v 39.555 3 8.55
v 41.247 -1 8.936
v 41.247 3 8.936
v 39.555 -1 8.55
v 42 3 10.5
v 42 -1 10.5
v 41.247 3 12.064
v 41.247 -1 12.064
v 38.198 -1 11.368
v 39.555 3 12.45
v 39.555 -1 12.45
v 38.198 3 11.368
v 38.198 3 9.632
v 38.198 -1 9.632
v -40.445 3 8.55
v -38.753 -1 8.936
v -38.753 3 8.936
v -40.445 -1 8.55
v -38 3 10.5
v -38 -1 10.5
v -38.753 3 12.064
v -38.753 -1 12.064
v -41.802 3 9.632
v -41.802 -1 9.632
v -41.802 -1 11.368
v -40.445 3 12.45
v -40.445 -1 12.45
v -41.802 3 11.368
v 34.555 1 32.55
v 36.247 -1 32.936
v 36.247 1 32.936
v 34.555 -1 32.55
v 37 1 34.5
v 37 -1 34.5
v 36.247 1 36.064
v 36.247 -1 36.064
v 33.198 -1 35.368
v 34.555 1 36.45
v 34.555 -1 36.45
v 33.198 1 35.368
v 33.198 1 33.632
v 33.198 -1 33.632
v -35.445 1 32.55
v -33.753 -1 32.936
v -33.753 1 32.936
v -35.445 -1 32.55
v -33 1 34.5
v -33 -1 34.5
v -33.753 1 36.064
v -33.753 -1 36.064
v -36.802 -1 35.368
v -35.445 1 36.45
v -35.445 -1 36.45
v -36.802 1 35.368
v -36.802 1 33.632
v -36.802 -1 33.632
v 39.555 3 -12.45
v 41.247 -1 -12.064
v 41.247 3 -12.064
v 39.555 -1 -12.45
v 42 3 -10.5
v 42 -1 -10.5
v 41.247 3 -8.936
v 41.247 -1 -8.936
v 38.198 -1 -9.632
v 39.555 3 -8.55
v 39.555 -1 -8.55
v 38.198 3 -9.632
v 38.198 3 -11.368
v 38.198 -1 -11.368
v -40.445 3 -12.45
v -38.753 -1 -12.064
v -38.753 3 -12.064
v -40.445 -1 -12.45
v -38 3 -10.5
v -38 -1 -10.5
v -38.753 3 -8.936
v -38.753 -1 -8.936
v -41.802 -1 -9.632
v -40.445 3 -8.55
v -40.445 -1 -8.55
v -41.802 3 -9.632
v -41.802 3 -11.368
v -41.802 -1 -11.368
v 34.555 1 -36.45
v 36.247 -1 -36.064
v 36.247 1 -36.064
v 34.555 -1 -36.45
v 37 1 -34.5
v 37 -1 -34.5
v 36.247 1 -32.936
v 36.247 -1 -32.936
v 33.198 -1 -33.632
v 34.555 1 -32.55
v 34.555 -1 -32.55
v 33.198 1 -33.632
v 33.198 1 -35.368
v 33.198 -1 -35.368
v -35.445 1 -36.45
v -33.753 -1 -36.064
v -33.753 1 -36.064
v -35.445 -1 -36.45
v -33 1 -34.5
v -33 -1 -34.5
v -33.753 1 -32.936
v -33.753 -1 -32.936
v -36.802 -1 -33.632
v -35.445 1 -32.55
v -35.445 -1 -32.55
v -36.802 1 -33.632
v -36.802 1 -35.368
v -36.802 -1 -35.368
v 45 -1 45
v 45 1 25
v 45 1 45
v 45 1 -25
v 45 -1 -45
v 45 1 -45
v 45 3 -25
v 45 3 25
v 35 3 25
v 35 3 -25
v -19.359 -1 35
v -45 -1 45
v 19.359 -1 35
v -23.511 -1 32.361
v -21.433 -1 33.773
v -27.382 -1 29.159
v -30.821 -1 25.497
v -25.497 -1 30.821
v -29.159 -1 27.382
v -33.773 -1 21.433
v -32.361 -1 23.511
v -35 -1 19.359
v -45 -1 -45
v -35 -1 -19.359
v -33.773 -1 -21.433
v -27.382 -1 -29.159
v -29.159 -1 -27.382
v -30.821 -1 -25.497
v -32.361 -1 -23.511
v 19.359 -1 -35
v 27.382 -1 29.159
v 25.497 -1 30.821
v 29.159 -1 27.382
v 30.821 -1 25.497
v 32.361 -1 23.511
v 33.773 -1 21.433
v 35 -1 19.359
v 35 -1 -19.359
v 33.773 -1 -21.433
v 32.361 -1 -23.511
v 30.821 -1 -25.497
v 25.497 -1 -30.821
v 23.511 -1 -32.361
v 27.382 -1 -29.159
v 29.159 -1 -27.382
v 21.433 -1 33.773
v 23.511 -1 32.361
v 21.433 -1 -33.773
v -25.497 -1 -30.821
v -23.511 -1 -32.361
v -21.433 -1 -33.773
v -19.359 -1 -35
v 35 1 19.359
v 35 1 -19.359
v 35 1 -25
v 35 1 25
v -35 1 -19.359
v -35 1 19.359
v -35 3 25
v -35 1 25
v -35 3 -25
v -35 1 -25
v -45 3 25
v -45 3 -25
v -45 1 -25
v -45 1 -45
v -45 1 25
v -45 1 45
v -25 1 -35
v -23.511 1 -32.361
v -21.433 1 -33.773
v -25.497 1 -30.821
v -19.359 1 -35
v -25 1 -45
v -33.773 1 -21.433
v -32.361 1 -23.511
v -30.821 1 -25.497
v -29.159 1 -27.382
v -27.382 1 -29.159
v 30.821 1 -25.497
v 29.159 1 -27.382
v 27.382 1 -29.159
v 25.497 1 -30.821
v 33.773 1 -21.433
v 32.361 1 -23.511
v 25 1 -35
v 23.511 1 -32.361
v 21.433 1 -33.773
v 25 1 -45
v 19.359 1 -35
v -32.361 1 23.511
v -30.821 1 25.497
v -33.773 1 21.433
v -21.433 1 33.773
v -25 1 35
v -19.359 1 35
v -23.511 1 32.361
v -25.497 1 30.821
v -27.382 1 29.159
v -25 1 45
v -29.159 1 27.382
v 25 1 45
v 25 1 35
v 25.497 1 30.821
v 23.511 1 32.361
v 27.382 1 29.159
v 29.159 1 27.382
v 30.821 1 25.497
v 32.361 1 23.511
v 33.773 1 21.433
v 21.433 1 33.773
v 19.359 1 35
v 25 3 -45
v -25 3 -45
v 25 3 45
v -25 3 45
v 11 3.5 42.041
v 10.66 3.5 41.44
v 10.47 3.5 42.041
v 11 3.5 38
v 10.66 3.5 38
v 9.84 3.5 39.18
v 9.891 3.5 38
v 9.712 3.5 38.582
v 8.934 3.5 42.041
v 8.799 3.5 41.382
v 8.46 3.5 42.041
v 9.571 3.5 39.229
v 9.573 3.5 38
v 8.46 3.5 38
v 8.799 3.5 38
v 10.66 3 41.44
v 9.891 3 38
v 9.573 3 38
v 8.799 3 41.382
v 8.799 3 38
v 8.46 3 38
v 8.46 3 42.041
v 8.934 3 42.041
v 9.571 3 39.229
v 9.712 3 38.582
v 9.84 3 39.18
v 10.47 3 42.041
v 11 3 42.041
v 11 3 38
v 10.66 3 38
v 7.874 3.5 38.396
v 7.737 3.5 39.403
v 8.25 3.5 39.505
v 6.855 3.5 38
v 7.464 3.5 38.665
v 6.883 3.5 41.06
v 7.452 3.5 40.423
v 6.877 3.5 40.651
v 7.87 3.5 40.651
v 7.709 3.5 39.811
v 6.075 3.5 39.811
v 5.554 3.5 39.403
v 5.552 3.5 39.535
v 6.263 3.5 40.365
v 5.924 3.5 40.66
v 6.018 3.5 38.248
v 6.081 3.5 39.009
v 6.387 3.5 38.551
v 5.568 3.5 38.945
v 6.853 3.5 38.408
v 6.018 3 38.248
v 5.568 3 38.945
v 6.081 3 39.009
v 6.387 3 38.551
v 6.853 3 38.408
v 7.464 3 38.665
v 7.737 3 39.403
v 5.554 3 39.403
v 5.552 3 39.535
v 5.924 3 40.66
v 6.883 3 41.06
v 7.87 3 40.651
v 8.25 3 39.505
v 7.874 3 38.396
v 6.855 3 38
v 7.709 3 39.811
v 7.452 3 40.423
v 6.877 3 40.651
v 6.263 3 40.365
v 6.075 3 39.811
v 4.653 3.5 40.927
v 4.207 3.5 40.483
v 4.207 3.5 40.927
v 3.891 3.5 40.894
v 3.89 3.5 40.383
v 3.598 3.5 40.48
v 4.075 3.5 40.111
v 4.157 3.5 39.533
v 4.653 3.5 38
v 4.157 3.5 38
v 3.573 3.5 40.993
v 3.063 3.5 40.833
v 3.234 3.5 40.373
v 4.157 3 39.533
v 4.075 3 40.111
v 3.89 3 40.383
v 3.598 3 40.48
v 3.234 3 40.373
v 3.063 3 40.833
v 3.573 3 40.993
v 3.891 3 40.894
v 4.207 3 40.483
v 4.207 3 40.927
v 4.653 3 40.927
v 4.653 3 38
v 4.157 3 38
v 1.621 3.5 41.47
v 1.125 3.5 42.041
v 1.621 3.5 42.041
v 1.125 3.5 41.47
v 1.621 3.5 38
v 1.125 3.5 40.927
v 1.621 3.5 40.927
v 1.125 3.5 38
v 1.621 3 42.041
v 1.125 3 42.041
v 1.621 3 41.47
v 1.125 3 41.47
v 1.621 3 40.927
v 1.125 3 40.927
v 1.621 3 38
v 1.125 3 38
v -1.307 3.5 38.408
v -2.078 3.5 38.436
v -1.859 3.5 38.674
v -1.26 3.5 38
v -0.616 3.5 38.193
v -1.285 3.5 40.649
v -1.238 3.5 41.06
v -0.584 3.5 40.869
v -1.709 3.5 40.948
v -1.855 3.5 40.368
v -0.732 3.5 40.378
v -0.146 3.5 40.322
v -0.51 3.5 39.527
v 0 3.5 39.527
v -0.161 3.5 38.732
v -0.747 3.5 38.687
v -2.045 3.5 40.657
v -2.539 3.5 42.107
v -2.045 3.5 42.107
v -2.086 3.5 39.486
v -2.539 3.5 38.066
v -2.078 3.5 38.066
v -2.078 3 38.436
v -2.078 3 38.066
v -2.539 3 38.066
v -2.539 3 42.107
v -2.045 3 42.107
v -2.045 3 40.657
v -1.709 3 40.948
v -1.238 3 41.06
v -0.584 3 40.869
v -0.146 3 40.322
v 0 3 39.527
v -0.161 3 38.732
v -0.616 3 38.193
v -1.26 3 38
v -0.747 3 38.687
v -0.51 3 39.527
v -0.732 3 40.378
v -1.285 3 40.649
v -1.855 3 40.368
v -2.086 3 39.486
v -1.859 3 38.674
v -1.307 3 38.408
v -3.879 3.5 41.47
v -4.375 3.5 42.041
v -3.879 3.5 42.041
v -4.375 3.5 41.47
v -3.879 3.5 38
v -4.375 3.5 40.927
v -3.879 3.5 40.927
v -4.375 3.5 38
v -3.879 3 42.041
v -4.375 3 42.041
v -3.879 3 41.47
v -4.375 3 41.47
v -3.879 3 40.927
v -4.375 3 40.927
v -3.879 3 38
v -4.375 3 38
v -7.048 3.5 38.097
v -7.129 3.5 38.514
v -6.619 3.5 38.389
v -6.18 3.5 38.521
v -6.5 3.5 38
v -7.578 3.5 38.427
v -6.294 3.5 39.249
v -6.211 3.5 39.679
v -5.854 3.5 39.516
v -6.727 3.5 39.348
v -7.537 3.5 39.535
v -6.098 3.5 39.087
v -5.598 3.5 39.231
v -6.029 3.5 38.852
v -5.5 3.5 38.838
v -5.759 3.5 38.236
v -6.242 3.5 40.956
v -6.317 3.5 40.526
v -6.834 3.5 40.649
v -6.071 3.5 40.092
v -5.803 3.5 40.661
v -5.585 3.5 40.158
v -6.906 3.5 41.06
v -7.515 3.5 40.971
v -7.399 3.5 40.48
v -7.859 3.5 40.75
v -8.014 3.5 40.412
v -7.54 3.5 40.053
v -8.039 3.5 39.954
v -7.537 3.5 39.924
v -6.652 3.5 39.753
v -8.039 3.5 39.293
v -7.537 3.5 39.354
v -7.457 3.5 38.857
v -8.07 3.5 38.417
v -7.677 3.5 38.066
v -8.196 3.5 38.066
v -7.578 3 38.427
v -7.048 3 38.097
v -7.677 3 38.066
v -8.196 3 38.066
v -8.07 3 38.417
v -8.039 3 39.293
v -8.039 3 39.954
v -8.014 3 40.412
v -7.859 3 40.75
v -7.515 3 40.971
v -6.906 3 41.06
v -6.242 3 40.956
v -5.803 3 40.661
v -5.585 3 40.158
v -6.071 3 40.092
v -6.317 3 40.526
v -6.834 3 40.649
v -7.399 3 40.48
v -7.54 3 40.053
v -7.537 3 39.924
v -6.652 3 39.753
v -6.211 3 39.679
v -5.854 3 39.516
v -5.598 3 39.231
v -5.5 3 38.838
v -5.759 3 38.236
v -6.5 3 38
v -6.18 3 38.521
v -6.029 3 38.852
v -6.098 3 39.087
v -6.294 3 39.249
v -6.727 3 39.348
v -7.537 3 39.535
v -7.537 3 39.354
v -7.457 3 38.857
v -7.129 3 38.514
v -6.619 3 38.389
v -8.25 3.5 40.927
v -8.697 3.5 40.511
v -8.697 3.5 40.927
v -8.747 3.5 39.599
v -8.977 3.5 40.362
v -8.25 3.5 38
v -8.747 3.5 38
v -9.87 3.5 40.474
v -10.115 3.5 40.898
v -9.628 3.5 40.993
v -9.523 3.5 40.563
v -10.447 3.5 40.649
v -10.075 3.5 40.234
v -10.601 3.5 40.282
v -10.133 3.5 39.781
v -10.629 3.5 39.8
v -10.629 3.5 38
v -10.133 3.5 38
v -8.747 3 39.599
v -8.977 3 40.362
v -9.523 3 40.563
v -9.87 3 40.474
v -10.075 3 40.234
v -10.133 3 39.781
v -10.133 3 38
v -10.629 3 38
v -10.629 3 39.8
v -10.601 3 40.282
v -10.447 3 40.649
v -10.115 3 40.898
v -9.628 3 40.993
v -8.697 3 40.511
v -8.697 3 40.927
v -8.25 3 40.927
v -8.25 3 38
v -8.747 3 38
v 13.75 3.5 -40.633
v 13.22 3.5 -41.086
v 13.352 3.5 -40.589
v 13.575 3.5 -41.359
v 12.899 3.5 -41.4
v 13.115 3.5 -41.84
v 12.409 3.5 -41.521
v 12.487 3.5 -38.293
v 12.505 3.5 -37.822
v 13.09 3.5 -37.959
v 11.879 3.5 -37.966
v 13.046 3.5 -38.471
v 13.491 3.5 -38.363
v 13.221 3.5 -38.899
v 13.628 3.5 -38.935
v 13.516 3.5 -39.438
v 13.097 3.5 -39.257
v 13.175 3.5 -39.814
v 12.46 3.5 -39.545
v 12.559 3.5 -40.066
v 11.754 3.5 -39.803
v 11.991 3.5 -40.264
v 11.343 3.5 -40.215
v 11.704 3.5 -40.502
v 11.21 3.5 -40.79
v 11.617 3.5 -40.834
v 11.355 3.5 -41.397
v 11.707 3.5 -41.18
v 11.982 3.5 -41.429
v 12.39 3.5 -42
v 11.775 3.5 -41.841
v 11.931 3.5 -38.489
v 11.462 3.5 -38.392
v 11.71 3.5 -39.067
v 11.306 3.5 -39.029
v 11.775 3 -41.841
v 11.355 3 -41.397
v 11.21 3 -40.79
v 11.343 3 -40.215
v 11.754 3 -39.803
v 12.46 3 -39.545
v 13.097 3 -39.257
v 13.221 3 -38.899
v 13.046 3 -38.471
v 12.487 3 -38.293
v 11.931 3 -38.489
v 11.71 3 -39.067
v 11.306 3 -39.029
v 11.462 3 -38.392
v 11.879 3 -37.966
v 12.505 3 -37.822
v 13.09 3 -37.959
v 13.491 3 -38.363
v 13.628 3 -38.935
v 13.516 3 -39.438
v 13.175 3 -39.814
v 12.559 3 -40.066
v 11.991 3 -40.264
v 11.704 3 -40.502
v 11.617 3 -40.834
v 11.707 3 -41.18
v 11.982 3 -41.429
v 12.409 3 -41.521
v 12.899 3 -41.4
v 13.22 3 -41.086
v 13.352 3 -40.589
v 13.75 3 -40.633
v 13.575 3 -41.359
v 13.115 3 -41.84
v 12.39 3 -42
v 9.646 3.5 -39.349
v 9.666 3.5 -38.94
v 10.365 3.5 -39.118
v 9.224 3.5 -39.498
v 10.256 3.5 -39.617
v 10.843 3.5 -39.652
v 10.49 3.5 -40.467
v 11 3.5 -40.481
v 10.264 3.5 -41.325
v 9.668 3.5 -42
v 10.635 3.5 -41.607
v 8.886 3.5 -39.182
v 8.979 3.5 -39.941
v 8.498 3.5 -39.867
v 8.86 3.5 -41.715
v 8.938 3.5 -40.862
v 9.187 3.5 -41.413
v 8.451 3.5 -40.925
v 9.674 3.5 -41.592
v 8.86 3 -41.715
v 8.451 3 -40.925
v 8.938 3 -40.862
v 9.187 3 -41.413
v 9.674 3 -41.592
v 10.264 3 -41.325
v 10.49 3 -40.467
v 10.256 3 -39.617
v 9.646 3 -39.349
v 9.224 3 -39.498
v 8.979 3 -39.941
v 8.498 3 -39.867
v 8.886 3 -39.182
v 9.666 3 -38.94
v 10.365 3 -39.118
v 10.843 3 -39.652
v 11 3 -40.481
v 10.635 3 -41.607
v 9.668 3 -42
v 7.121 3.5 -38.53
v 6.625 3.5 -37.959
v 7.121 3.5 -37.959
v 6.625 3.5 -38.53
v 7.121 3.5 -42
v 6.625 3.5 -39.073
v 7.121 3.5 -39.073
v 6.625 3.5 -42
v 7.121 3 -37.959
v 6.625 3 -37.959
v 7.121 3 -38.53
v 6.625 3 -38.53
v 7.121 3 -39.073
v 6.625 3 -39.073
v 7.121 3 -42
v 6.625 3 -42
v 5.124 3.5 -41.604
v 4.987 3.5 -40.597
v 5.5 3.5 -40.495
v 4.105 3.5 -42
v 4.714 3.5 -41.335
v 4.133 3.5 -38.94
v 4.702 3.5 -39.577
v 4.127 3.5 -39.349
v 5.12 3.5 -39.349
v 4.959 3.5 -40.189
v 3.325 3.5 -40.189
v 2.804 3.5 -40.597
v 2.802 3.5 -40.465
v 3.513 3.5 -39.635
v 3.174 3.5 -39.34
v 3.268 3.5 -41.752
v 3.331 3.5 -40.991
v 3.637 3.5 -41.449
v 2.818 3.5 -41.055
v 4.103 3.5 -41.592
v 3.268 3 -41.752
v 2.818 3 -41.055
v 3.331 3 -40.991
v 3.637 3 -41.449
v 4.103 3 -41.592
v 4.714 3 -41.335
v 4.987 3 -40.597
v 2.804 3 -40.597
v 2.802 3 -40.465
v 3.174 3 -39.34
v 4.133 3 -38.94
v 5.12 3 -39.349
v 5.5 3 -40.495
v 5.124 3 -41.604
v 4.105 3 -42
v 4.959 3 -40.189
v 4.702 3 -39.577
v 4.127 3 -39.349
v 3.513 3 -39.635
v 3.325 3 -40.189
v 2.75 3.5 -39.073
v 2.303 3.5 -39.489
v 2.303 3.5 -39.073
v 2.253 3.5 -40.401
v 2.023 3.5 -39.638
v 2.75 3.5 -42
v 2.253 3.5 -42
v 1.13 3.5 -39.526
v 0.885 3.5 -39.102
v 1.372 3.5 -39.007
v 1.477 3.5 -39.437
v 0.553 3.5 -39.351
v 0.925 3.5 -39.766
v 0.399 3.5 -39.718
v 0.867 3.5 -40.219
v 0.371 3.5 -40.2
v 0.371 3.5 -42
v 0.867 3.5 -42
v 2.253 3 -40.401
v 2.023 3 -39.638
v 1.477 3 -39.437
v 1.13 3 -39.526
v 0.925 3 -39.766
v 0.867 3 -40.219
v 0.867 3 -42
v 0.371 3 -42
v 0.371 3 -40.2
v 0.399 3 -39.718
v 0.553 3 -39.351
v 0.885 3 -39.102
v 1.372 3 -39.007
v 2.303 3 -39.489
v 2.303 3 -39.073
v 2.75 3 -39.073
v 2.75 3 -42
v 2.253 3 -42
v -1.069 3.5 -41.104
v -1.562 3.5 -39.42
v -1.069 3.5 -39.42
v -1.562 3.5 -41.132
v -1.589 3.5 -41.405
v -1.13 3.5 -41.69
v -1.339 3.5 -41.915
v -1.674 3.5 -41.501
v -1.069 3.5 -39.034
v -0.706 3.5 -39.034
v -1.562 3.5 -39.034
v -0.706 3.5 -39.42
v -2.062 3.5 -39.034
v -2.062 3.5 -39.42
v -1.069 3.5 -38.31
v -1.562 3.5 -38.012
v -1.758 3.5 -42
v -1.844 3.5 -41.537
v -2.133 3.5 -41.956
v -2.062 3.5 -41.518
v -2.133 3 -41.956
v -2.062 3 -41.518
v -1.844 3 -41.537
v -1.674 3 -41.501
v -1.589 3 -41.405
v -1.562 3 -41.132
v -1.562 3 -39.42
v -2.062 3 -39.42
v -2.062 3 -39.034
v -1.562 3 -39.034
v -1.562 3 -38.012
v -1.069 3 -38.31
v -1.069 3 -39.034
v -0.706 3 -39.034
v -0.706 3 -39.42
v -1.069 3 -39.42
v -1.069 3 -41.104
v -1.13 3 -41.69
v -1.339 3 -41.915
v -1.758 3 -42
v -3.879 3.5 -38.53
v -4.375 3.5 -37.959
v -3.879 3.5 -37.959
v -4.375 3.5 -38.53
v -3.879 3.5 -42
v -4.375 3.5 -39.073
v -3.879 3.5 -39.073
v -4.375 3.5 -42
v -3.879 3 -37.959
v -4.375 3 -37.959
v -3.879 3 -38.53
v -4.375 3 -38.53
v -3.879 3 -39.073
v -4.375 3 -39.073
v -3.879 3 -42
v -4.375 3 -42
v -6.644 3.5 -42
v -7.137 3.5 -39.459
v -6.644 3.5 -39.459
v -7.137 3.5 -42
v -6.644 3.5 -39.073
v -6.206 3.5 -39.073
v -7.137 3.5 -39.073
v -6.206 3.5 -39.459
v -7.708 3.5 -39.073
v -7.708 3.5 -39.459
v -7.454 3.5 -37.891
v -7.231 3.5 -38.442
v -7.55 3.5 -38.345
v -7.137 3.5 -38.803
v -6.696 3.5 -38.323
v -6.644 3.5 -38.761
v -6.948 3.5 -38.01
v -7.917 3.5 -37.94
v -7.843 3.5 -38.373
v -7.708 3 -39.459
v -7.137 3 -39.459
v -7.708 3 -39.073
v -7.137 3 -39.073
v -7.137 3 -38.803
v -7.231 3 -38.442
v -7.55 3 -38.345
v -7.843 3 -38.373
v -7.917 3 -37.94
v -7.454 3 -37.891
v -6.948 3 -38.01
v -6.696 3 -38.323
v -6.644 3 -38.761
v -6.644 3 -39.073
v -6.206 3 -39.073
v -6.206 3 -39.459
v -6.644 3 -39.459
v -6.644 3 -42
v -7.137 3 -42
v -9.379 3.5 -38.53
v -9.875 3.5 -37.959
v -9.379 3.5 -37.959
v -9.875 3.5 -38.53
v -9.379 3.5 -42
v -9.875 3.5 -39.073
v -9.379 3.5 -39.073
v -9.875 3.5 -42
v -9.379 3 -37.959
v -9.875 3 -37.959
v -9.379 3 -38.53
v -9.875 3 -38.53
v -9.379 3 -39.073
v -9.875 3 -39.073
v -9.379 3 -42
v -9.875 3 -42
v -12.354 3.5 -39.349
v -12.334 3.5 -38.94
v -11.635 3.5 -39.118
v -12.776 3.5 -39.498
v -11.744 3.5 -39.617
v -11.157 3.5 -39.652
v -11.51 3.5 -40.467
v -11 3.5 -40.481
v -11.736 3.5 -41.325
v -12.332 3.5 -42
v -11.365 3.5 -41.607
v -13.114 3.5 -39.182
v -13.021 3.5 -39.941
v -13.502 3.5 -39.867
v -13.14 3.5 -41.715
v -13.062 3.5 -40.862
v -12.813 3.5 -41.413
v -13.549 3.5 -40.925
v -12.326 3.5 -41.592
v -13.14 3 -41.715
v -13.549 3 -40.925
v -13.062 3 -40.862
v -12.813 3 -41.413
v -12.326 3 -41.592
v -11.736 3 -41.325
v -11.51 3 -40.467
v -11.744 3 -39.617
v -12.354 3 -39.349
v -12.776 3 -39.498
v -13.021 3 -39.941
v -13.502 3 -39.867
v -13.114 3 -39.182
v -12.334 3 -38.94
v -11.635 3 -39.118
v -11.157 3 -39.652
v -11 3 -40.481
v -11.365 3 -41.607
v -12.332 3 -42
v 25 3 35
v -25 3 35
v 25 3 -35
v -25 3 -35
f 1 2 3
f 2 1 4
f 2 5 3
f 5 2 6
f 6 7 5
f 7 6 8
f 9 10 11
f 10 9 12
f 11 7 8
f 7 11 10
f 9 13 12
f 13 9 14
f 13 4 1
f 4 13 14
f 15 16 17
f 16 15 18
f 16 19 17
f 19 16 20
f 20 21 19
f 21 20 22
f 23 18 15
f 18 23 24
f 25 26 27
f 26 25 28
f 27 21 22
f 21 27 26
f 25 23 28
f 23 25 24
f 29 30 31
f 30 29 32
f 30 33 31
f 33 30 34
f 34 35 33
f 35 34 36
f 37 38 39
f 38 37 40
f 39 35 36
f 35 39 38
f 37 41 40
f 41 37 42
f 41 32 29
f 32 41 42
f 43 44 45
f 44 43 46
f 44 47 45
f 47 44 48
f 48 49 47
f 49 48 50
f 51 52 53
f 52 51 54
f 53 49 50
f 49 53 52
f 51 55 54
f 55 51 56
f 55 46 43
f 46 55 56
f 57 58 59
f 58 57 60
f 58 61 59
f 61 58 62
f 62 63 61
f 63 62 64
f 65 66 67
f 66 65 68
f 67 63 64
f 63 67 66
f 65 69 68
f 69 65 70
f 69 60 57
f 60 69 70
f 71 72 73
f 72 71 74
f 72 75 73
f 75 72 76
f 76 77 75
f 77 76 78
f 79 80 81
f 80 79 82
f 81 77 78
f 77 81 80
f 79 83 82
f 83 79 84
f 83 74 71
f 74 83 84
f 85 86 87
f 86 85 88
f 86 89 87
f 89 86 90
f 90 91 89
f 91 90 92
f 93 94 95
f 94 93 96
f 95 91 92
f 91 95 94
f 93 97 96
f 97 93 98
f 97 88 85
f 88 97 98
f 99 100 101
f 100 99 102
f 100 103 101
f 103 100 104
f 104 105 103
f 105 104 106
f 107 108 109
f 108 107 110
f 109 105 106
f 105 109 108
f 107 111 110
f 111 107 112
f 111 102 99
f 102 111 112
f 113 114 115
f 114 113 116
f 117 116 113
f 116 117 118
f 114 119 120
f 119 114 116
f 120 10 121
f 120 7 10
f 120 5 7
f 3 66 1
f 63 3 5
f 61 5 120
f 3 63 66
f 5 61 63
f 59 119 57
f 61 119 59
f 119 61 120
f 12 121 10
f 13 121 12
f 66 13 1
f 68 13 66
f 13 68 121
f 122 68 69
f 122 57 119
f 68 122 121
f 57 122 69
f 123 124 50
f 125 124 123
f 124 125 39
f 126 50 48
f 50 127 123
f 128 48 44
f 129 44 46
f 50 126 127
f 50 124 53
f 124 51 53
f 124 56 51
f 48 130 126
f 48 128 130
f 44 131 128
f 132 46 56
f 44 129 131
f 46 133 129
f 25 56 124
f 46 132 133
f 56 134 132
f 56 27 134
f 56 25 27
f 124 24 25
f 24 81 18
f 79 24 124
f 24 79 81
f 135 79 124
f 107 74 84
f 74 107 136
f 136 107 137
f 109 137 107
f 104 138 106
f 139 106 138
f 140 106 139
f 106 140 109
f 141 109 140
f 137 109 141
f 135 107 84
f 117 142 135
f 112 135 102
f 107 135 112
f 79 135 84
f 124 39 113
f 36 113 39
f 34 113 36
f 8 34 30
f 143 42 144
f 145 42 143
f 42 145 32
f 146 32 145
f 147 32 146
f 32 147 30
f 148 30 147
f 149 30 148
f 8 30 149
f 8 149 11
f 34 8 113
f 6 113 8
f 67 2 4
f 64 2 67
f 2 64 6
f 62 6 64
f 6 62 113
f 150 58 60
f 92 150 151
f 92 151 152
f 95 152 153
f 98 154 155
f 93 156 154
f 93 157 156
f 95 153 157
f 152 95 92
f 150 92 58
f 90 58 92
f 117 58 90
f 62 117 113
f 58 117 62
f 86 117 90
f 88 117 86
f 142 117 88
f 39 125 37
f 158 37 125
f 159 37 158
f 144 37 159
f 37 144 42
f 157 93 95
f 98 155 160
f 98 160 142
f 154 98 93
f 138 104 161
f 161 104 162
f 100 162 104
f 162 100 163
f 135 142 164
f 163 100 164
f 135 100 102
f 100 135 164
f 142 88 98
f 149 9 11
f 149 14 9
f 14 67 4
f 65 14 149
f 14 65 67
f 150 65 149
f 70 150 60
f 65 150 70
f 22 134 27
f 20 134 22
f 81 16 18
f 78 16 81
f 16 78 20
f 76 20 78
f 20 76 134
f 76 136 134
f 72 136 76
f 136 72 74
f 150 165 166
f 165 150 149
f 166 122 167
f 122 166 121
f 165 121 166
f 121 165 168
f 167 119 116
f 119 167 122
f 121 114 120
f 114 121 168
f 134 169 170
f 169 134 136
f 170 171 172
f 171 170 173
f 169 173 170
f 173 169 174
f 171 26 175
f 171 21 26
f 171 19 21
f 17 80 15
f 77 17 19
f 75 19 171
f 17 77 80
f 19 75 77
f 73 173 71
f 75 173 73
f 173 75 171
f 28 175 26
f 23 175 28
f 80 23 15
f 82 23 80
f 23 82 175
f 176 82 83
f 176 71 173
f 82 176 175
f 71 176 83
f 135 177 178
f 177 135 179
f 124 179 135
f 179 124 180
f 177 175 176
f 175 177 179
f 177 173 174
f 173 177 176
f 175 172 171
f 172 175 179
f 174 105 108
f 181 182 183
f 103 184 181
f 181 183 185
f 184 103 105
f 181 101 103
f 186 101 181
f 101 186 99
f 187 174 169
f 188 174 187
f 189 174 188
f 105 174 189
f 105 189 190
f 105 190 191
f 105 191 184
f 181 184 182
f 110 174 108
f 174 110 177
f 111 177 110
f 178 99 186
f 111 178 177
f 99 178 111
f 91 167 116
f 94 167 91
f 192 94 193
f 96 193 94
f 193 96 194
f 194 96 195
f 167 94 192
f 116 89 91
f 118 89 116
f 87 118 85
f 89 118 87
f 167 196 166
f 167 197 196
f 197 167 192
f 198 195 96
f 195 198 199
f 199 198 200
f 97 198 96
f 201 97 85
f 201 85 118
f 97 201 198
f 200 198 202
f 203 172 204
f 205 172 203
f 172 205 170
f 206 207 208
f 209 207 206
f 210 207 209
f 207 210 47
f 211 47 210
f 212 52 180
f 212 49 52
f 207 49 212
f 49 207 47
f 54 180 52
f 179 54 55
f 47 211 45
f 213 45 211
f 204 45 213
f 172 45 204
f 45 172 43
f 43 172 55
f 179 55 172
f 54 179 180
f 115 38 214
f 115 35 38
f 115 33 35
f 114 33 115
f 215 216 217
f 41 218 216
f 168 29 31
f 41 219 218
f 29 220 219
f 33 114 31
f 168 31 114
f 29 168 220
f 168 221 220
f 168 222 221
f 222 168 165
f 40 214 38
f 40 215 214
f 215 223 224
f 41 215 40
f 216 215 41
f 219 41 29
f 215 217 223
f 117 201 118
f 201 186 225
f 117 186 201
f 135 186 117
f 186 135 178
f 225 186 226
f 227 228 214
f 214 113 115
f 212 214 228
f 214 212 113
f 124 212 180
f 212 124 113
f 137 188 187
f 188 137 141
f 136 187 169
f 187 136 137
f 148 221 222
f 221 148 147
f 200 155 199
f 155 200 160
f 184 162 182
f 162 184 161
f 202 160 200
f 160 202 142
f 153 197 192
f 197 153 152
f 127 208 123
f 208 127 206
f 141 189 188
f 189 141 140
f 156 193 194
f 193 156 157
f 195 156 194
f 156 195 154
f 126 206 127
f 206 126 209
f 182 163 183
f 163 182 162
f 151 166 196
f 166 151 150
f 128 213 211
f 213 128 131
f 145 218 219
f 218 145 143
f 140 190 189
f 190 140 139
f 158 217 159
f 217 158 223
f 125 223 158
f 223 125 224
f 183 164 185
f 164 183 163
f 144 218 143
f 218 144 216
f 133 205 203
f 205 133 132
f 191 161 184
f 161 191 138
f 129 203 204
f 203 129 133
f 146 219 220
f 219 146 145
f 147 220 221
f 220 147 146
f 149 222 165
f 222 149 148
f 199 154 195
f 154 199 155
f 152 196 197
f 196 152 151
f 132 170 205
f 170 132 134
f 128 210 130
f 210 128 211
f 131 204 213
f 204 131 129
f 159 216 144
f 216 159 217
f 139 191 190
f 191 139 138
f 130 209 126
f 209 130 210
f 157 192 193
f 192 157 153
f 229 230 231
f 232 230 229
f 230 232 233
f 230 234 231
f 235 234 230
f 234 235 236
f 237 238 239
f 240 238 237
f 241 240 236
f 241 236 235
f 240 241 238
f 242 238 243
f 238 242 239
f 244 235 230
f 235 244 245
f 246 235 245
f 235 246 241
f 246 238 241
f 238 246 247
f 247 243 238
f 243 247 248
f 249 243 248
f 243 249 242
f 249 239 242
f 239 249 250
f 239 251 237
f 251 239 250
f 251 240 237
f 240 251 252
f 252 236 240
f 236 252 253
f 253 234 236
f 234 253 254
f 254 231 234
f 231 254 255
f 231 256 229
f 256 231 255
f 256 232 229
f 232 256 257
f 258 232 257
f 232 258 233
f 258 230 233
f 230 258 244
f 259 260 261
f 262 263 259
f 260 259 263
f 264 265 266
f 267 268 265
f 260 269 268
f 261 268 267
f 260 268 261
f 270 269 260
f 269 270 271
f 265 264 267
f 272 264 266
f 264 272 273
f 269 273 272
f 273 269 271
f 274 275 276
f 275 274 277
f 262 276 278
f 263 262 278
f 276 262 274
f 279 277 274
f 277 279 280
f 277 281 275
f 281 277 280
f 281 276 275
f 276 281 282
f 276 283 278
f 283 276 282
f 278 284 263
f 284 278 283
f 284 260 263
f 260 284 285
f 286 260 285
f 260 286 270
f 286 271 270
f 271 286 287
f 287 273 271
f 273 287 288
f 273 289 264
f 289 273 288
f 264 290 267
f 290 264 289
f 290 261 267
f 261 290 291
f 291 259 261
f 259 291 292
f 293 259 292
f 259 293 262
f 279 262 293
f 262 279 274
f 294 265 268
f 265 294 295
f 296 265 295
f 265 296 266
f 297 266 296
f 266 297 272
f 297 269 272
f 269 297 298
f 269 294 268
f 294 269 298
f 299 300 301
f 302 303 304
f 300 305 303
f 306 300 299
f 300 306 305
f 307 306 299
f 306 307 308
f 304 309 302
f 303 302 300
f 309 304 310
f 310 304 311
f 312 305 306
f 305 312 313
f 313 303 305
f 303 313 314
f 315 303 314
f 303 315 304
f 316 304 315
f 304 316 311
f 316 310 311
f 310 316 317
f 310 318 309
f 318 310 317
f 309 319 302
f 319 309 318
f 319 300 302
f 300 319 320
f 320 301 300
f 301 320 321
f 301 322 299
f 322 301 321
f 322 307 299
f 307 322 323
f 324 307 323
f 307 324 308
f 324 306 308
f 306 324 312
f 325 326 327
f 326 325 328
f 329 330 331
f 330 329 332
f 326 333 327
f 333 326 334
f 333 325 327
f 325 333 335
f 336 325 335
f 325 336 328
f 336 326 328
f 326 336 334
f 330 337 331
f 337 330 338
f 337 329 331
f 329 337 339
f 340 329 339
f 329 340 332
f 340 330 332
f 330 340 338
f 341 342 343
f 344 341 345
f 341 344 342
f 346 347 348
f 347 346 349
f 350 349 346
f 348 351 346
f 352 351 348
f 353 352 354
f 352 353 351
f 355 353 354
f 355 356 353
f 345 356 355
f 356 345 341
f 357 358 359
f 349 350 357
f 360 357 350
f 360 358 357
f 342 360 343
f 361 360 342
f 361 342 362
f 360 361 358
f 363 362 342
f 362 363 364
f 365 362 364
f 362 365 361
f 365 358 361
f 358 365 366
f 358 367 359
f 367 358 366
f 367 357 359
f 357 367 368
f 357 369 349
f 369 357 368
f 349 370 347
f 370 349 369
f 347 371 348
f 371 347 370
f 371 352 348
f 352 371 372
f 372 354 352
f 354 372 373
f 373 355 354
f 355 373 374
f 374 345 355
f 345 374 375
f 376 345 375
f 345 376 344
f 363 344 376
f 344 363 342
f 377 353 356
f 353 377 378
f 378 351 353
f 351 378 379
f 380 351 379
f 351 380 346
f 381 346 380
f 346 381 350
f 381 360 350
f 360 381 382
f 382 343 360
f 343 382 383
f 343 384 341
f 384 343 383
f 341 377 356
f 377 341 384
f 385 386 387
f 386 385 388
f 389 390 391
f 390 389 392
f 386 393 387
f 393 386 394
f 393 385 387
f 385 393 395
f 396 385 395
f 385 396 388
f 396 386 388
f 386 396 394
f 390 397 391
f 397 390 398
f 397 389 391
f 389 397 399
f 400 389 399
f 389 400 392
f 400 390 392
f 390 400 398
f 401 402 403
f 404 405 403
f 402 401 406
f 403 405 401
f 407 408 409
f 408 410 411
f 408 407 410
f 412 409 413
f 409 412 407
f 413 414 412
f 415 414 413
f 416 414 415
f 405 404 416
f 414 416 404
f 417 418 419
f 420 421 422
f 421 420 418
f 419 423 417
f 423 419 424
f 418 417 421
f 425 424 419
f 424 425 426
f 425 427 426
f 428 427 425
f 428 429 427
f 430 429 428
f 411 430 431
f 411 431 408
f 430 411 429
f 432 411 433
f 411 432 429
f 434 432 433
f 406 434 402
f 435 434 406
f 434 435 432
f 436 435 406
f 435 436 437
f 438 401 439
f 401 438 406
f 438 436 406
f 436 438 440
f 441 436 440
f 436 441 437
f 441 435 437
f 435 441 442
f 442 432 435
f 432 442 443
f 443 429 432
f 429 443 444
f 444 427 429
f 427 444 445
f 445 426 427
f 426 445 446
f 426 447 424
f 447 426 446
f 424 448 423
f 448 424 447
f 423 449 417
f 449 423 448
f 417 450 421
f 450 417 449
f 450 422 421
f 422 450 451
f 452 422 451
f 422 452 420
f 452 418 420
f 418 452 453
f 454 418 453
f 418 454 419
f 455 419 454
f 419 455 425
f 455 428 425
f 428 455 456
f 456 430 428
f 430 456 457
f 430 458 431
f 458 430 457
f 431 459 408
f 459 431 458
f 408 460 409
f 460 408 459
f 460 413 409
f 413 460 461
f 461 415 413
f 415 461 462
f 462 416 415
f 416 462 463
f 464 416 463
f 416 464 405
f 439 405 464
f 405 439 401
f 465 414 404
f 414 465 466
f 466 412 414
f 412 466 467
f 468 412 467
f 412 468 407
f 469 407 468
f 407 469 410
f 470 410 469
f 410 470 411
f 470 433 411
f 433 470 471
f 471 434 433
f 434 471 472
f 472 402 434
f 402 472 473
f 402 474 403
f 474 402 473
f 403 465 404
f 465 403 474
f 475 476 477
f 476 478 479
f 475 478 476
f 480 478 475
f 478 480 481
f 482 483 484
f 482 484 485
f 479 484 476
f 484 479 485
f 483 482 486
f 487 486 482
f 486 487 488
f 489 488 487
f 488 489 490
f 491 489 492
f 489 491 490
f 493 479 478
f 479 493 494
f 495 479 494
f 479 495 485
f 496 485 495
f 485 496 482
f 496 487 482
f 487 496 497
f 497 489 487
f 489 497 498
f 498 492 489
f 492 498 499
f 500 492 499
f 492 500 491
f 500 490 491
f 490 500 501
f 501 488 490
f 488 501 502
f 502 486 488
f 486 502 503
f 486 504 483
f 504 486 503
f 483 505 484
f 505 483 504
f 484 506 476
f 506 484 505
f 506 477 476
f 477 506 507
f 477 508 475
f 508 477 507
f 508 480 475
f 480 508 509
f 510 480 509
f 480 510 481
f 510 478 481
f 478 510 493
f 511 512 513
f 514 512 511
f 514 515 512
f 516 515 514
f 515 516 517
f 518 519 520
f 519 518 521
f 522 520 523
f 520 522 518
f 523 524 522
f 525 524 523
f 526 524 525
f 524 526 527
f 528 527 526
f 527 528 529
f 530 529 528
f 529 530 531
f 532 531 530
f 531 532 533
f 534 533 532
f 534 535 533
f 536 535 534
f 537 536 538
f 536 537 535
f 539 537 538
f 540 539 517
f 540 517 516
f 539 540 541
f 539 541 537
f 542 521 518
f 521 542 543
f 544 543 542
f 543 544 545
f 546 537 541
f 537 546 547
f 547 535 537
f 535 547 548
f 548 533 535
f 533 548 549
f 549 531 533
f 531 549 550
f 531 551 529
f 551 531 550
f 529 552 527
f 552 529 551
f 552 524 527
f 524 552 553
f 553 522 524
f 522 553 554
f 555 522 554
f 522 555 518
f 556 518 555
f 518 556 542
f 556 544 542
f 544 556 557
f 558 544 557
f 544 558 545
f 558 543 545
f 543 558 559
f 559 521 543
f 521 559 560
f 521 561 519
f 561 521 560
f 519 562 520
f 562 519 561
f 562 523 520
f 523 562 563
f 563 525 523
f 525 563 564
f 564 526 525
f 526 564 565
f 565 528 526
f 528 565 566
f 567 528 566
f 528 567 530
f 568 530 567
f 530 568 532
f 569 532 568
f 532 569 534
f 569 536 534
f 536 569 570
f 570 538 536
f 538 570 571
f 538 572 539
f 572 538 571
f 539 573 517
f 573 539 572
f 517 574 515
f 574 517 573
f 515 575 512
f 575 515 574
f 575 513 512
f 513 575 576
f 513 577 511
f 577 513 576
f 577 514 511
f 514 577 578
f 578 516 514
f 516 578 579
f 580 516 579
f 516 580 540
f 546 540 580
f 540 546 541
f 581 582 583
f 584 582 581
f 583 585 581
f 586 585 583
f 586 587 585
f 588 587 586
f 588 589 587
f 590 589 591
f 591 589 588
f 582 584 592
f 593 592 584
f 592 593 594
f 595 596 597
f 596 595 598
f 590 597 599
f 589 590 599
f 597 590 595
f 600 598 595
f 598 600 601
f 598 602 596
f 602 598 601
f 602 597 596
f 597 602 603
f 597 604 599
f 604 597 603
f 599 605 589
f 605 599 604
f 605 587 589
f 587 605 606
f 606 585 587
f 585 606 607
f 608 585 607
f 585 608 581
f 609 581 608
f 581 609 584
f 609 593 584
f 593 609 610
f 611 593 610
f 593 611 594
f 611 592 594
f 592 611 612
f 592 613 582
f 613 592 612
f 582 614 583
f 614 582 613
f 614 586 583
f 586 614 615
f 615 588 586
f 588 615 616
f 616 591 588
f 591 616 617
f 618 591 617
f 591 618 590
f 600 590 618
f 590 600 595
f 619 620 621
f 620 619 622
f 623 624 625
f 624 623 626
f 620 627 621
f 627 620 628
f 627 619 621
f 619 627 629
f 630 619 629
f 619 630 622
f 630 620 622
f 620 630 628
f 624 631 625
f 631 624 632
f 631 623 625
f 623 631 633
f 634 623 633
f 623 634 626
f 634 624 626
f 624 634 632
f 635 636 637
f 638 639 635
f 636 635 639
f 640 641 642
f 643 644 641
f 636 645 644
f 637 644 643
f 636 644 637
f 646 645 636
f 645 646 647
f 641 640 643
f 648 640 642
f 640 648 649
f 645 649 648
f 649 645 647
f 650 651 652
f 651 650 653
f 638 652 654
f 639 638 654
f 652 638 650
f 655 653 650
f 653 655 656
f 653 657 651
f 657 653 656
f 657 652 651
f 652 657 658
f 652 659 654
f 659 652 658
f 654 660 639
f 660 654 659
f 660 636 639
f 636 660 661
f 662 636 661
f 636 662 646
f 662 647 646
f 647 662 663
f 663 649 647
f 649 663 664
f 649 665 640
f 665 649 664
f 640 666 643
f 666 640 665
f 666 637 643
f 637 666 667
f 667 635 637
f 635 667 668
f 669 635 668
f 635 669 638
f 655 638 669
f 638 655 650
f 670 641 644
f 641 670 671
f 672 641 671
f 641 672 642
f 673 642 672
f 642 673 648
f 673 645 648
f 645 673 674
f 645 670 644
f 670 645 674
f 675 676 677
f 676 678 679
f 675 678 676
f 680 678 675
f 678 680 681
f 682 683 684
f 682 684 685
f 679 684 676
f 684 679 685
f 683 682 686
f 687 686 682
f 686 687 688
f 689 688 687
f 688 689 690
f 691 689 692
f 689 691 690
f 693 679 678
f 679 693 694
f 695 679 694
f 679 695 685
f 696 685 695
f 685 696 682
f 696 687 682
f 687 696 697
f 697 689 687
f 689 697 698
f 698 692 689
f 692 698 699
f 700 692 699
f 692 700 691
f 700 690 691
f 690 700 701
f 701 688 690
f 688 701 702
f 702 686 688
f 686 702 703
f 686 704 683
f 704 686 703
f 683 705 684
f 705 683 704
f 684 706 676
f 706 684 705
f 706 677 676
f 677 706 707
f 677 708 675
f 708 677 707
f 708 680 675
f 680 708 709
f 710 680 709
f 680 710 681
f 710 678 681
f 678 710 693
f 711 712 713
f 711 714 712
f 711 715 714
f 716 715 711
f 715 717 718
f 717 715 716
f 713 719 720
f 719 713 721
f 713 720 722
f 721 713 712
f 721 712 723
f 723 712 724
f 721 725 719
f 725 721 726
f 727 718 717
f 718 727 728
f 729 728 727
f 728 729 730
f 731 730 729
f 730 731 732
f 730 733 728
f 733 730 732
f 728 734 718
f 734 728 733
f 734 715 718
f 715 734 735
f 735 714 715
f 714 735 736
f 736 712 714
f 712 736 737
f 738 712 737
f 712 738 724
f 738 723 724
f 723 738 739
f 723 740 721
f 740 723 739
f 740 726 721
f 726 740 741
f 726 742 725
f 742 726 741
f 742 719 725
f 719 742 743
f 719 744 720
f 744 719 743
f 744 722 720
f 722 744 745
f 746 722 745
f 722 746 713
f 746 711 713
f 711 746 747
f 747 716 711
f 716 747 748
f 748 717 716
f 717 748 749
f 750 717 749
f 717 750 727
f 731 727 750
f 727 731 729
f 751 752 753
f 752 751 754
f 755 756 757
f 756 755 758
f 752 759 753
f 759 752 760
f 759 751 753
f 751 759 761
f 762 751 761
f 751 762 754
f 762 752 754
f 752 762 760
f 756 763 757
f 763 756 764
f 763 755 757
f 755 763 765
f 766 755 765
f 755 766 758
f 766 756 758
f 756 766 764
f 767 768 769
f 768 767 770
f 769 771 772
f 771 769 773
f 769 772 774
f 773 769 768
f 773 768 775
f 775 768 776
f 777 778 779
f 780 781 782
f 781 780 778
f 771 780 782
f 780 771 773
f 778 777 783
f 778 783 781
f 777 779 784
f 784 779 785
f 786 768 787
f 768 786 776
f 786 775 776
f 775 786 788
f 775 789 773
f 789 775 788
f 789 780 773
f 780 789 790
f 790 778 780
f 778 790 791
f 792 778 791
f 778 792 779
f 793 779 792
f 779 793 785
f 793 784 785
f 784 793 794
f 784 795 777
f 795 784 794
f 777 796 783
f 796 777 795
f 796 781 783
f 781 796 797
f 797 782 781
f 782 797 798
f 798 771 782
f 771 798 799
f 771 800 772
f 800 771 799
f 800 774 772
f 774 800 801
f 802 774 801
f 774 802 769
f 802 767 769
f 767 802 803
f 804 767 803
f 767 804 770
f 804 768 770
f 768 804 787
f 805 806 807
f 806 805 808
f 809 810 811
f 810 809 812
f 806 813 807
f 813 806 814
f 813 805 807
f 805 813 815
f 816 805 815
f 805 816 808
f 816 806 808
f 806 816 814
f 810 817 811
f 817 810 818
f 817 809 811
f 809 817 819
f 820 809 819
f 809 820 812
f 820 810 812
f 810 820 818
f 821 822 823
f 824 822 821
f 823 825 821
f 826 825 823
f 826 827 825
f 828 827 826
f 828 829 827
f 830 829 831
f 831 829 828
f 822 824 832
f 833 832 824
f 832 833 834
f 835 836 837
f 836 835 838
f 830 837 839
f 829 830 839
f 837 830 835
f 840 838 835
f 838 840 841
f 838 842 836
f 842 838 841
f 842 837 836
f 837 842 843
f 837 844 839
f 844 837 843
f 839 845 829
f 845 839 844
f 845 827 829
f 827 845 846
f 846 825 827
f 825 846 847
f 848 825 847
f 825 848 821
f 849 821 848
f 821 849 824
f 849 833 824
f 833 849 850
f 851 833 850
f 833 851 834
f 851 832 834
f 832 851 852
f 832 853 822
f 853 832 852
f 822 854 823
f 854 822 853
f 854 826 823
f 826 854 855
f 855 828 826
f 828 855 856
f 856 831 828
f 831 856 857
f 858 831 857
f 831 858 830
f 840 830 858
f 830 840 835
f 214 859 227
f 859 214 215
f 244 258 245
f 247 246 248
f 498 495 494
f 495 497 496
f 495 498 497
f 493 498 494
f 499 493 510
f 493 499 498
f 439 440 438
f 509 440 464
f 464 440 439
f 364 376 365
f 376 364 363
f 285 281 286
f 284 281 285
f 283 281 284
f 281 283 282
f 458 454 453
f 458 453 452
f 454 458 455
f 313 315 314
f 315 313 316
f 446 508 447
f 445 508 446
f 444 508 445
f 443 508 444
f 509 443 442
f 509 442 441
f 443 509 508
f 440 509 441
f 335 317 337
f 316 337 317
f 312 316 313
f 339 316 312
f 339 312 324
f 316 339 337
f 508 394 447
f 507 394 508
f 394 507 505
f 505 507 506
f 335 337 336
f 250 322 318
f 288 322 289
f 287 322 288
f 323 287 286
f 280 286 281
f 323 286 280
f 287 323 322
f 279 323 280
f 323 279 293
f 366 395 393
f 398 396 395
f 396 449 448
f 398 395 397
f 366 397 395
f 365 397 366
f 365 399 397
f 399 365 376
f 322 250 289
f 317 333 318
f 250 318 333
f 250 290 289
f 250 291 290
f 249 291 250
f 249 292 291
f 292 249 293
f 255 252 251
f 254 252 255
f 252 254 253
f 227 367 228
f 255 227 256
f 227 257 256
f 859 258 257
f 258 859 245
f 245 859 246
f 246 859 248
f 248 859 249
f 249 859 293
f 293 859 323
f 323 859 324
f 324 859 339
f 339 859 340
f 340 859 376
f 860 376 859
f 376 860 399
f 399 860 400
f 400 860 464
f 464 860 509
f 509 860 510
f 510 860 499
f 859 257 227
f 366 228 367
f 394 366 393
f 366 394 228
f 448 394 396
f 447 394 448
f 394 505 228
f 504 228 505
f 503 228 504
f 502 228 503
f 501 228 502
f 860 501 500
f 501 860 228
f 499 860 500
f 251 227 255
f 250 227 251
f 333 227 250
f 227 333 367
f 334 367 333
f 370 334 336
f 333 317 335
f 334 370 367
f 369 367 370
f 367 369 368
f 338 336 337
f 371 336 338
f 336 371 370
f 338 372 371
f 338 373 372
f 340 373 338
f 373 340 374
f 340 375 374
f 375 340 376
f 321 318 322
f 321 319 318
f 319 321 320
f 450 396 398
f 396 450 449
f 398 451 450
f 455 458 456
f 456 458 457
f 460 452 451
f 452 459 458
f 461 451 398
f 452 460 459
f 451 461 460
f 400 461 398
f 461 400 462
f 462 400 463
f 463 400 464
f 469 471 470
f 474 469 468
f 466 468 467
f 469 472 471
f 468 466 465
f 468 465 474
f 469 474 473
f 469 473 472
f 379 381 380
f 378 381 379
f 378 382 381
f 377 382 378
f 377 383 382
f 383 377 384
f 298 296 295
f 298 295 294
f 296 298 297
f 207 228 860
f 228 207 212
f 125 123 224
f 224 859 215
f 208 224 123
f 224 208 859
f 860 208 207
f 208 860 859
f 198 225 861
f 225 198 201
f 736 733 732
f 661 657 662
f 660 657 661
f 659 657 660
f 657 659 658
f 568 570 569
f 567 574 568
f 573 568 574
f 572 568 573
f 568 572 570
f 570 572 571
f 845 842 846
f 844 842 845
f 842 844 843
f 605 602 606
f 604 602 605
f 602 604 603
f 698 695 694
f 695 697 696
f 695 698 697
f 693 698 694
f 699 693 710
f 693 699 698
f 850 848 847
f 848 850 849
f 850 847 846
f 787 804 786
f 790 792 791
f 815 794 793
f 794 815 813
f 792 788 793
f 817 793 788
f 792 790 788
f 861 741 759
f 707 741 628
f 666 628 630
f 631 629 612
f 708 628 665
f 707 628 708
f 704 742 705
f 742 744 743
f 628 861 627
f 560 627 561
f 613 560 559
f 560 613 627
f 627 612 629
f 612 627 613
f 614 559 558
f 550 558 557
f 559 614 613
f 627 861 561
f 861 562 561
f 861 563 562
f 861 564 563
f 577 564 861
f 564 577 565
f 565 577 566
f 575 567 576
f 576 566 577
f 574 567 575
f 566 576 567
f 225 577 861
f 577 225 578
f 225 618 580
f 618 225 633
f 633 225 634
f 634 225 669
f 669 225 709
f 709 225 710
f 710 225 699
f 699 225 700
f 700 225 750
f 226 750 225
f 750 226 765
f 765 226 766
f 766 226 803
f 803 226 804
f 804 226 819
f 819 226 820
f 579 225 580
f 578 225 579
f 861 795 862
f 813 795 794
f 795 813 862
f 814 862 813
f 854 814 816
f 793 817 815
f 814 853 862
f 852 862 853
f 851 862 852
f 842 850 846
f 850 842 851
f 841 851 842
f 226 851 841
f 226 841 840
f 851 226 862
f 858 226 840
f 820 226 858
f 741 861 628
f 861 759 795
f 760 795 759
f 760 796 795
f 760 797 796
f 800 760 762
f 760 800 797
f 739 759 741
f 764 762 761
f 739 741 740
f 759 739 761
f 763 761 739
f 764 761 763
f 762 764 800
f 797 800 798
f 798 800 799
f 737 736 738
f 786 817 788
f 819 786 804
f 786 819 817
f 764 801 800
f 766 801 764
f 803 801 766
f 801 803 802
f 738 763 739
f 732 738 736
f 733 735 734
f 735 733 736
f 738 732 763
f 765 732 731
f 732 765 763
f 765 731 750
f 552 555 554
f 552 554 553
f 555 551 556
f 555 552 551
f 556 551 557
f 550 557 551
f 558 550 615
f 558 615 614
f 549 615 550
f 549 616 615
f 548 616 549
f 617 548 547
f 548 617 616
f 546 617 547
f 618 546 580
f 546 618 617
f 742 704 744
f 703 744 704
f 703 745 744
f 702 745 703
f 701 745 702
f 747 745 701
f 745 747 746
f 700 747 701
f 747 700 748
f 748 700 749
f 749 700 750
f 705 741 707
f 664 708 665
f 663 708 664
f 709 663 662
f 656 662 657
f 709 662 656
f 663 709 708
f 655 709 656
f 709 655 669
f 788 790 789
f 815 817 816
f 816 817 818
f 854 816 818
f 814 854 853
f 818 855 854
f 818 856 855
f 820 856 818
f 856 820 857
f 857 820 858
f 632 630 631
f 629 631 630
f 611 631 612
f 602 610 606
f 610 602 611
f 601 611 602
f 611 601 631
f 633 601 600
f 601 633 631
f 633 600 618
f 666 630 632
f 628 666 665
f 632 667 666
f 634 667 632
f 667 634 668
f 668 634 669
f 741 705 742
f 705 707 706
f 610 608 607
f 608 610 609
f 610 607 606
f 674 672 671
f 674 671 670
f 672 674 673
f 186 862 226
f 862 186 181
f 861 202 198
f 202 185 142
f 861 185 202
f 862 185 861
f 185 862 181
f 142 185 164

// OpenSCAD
// file: ../filterMount_screwHoles.scad
module upperScrewHoles(){
	//upperMiddleHalf
	translate([40,12,0]) cylinder(h=30,r=2,center=true);
	translate([-40,12,0]) cylinder(h=30,r=2,center=true);
	//upperHalf
	translate([35,-12,0]) cylinder(h=30,r=2,center=true);
	translate([-35,-12,0]) cylinder(h=30,r=2,center=true);
}

module lowerScrewHoles(){
	//lowerMiddleHalf
	translate([40,-12,0]) cylinder(h=30,r=2,center=true);
	translate([-40,-12,0]) cylinder(h=30,r=2,center=true);
	//bottomwHalf
	translate([35,12,0]) cylinder(h=30,r=2,center=true);
	translate([-35,12,0]) cylinder(h=30,r=2,center=true);
}

upperScrewHoles();
lowerScrewHoles();
// file: ../filterMount_retainingBracket.scad
use <write.scad>
use <filterMount_screwHoles.scad>

module filterMountRetainingBracket(){
	//leftBlock
	difference(){
		translate([40,0,1]){
			color([.7,.9,.1]) cube(size=[10,50,4],center=true);
		}
		//screwHoles
		translate([0,-22.5,0]){
			upperScrewHoles();
		}
		translate([0,22.5,0]){
			lowerScrewHoles();
		}
	}
	//rightBlock
	difference(){
		translate([-40,0,1]){
			color([.7,.9,.1]) cube(size=[10,50,4],center=true);
		}
		//screwHoles
		translate([0,-22.5,0]){
			upperScrewHoles();
		}
		translate([0,22.5,0]){
			lowerScrewHoles();
		}
	}
	//upperBlock
	translate([0,-40,1]){
		color([.7,.9,.1]) cube(size=[50,10,4],center=true);
	}
	//lowerBlock
	translate([0,40,1]){
		color([.7,.9,.1]) cube(size=[50,10,4],center=true);
	}
	//frame
	difference(){
		//mountBody
		color([.7,.9,.1]) cube(size=[90,90,2],center=true);
		//filterHole
		translate([0,0,0]) cylinder(h=7,r=40,$fn=100,center=true);
		//screwHoles
		translate([0,-22.5,0]){
			upperScrewHoles();
		}
		translate([0,22.5,0]){
			lowerScrewHoles();
		}
	}
	rotate(180,0,0){
		translate([0,40,2]){
			write("Meridian",h=4,t=3,center=true);
		}
		translate([0,-40,2]){
			write("Scientific",h=4,t=3,center=true);
		}
	}
}

//filterMountRetainingBracket
rotate([-90,0,0]) translate([0,0,0]){
	filterMountRetainingBracket();
}
// main file
use <../filterMount_retainingBracket.scad>

//filterMountRetainingBracket
rotate([-90,0,0]) translate([0,0,00]){
	filterMountRetainingBracket();
}
